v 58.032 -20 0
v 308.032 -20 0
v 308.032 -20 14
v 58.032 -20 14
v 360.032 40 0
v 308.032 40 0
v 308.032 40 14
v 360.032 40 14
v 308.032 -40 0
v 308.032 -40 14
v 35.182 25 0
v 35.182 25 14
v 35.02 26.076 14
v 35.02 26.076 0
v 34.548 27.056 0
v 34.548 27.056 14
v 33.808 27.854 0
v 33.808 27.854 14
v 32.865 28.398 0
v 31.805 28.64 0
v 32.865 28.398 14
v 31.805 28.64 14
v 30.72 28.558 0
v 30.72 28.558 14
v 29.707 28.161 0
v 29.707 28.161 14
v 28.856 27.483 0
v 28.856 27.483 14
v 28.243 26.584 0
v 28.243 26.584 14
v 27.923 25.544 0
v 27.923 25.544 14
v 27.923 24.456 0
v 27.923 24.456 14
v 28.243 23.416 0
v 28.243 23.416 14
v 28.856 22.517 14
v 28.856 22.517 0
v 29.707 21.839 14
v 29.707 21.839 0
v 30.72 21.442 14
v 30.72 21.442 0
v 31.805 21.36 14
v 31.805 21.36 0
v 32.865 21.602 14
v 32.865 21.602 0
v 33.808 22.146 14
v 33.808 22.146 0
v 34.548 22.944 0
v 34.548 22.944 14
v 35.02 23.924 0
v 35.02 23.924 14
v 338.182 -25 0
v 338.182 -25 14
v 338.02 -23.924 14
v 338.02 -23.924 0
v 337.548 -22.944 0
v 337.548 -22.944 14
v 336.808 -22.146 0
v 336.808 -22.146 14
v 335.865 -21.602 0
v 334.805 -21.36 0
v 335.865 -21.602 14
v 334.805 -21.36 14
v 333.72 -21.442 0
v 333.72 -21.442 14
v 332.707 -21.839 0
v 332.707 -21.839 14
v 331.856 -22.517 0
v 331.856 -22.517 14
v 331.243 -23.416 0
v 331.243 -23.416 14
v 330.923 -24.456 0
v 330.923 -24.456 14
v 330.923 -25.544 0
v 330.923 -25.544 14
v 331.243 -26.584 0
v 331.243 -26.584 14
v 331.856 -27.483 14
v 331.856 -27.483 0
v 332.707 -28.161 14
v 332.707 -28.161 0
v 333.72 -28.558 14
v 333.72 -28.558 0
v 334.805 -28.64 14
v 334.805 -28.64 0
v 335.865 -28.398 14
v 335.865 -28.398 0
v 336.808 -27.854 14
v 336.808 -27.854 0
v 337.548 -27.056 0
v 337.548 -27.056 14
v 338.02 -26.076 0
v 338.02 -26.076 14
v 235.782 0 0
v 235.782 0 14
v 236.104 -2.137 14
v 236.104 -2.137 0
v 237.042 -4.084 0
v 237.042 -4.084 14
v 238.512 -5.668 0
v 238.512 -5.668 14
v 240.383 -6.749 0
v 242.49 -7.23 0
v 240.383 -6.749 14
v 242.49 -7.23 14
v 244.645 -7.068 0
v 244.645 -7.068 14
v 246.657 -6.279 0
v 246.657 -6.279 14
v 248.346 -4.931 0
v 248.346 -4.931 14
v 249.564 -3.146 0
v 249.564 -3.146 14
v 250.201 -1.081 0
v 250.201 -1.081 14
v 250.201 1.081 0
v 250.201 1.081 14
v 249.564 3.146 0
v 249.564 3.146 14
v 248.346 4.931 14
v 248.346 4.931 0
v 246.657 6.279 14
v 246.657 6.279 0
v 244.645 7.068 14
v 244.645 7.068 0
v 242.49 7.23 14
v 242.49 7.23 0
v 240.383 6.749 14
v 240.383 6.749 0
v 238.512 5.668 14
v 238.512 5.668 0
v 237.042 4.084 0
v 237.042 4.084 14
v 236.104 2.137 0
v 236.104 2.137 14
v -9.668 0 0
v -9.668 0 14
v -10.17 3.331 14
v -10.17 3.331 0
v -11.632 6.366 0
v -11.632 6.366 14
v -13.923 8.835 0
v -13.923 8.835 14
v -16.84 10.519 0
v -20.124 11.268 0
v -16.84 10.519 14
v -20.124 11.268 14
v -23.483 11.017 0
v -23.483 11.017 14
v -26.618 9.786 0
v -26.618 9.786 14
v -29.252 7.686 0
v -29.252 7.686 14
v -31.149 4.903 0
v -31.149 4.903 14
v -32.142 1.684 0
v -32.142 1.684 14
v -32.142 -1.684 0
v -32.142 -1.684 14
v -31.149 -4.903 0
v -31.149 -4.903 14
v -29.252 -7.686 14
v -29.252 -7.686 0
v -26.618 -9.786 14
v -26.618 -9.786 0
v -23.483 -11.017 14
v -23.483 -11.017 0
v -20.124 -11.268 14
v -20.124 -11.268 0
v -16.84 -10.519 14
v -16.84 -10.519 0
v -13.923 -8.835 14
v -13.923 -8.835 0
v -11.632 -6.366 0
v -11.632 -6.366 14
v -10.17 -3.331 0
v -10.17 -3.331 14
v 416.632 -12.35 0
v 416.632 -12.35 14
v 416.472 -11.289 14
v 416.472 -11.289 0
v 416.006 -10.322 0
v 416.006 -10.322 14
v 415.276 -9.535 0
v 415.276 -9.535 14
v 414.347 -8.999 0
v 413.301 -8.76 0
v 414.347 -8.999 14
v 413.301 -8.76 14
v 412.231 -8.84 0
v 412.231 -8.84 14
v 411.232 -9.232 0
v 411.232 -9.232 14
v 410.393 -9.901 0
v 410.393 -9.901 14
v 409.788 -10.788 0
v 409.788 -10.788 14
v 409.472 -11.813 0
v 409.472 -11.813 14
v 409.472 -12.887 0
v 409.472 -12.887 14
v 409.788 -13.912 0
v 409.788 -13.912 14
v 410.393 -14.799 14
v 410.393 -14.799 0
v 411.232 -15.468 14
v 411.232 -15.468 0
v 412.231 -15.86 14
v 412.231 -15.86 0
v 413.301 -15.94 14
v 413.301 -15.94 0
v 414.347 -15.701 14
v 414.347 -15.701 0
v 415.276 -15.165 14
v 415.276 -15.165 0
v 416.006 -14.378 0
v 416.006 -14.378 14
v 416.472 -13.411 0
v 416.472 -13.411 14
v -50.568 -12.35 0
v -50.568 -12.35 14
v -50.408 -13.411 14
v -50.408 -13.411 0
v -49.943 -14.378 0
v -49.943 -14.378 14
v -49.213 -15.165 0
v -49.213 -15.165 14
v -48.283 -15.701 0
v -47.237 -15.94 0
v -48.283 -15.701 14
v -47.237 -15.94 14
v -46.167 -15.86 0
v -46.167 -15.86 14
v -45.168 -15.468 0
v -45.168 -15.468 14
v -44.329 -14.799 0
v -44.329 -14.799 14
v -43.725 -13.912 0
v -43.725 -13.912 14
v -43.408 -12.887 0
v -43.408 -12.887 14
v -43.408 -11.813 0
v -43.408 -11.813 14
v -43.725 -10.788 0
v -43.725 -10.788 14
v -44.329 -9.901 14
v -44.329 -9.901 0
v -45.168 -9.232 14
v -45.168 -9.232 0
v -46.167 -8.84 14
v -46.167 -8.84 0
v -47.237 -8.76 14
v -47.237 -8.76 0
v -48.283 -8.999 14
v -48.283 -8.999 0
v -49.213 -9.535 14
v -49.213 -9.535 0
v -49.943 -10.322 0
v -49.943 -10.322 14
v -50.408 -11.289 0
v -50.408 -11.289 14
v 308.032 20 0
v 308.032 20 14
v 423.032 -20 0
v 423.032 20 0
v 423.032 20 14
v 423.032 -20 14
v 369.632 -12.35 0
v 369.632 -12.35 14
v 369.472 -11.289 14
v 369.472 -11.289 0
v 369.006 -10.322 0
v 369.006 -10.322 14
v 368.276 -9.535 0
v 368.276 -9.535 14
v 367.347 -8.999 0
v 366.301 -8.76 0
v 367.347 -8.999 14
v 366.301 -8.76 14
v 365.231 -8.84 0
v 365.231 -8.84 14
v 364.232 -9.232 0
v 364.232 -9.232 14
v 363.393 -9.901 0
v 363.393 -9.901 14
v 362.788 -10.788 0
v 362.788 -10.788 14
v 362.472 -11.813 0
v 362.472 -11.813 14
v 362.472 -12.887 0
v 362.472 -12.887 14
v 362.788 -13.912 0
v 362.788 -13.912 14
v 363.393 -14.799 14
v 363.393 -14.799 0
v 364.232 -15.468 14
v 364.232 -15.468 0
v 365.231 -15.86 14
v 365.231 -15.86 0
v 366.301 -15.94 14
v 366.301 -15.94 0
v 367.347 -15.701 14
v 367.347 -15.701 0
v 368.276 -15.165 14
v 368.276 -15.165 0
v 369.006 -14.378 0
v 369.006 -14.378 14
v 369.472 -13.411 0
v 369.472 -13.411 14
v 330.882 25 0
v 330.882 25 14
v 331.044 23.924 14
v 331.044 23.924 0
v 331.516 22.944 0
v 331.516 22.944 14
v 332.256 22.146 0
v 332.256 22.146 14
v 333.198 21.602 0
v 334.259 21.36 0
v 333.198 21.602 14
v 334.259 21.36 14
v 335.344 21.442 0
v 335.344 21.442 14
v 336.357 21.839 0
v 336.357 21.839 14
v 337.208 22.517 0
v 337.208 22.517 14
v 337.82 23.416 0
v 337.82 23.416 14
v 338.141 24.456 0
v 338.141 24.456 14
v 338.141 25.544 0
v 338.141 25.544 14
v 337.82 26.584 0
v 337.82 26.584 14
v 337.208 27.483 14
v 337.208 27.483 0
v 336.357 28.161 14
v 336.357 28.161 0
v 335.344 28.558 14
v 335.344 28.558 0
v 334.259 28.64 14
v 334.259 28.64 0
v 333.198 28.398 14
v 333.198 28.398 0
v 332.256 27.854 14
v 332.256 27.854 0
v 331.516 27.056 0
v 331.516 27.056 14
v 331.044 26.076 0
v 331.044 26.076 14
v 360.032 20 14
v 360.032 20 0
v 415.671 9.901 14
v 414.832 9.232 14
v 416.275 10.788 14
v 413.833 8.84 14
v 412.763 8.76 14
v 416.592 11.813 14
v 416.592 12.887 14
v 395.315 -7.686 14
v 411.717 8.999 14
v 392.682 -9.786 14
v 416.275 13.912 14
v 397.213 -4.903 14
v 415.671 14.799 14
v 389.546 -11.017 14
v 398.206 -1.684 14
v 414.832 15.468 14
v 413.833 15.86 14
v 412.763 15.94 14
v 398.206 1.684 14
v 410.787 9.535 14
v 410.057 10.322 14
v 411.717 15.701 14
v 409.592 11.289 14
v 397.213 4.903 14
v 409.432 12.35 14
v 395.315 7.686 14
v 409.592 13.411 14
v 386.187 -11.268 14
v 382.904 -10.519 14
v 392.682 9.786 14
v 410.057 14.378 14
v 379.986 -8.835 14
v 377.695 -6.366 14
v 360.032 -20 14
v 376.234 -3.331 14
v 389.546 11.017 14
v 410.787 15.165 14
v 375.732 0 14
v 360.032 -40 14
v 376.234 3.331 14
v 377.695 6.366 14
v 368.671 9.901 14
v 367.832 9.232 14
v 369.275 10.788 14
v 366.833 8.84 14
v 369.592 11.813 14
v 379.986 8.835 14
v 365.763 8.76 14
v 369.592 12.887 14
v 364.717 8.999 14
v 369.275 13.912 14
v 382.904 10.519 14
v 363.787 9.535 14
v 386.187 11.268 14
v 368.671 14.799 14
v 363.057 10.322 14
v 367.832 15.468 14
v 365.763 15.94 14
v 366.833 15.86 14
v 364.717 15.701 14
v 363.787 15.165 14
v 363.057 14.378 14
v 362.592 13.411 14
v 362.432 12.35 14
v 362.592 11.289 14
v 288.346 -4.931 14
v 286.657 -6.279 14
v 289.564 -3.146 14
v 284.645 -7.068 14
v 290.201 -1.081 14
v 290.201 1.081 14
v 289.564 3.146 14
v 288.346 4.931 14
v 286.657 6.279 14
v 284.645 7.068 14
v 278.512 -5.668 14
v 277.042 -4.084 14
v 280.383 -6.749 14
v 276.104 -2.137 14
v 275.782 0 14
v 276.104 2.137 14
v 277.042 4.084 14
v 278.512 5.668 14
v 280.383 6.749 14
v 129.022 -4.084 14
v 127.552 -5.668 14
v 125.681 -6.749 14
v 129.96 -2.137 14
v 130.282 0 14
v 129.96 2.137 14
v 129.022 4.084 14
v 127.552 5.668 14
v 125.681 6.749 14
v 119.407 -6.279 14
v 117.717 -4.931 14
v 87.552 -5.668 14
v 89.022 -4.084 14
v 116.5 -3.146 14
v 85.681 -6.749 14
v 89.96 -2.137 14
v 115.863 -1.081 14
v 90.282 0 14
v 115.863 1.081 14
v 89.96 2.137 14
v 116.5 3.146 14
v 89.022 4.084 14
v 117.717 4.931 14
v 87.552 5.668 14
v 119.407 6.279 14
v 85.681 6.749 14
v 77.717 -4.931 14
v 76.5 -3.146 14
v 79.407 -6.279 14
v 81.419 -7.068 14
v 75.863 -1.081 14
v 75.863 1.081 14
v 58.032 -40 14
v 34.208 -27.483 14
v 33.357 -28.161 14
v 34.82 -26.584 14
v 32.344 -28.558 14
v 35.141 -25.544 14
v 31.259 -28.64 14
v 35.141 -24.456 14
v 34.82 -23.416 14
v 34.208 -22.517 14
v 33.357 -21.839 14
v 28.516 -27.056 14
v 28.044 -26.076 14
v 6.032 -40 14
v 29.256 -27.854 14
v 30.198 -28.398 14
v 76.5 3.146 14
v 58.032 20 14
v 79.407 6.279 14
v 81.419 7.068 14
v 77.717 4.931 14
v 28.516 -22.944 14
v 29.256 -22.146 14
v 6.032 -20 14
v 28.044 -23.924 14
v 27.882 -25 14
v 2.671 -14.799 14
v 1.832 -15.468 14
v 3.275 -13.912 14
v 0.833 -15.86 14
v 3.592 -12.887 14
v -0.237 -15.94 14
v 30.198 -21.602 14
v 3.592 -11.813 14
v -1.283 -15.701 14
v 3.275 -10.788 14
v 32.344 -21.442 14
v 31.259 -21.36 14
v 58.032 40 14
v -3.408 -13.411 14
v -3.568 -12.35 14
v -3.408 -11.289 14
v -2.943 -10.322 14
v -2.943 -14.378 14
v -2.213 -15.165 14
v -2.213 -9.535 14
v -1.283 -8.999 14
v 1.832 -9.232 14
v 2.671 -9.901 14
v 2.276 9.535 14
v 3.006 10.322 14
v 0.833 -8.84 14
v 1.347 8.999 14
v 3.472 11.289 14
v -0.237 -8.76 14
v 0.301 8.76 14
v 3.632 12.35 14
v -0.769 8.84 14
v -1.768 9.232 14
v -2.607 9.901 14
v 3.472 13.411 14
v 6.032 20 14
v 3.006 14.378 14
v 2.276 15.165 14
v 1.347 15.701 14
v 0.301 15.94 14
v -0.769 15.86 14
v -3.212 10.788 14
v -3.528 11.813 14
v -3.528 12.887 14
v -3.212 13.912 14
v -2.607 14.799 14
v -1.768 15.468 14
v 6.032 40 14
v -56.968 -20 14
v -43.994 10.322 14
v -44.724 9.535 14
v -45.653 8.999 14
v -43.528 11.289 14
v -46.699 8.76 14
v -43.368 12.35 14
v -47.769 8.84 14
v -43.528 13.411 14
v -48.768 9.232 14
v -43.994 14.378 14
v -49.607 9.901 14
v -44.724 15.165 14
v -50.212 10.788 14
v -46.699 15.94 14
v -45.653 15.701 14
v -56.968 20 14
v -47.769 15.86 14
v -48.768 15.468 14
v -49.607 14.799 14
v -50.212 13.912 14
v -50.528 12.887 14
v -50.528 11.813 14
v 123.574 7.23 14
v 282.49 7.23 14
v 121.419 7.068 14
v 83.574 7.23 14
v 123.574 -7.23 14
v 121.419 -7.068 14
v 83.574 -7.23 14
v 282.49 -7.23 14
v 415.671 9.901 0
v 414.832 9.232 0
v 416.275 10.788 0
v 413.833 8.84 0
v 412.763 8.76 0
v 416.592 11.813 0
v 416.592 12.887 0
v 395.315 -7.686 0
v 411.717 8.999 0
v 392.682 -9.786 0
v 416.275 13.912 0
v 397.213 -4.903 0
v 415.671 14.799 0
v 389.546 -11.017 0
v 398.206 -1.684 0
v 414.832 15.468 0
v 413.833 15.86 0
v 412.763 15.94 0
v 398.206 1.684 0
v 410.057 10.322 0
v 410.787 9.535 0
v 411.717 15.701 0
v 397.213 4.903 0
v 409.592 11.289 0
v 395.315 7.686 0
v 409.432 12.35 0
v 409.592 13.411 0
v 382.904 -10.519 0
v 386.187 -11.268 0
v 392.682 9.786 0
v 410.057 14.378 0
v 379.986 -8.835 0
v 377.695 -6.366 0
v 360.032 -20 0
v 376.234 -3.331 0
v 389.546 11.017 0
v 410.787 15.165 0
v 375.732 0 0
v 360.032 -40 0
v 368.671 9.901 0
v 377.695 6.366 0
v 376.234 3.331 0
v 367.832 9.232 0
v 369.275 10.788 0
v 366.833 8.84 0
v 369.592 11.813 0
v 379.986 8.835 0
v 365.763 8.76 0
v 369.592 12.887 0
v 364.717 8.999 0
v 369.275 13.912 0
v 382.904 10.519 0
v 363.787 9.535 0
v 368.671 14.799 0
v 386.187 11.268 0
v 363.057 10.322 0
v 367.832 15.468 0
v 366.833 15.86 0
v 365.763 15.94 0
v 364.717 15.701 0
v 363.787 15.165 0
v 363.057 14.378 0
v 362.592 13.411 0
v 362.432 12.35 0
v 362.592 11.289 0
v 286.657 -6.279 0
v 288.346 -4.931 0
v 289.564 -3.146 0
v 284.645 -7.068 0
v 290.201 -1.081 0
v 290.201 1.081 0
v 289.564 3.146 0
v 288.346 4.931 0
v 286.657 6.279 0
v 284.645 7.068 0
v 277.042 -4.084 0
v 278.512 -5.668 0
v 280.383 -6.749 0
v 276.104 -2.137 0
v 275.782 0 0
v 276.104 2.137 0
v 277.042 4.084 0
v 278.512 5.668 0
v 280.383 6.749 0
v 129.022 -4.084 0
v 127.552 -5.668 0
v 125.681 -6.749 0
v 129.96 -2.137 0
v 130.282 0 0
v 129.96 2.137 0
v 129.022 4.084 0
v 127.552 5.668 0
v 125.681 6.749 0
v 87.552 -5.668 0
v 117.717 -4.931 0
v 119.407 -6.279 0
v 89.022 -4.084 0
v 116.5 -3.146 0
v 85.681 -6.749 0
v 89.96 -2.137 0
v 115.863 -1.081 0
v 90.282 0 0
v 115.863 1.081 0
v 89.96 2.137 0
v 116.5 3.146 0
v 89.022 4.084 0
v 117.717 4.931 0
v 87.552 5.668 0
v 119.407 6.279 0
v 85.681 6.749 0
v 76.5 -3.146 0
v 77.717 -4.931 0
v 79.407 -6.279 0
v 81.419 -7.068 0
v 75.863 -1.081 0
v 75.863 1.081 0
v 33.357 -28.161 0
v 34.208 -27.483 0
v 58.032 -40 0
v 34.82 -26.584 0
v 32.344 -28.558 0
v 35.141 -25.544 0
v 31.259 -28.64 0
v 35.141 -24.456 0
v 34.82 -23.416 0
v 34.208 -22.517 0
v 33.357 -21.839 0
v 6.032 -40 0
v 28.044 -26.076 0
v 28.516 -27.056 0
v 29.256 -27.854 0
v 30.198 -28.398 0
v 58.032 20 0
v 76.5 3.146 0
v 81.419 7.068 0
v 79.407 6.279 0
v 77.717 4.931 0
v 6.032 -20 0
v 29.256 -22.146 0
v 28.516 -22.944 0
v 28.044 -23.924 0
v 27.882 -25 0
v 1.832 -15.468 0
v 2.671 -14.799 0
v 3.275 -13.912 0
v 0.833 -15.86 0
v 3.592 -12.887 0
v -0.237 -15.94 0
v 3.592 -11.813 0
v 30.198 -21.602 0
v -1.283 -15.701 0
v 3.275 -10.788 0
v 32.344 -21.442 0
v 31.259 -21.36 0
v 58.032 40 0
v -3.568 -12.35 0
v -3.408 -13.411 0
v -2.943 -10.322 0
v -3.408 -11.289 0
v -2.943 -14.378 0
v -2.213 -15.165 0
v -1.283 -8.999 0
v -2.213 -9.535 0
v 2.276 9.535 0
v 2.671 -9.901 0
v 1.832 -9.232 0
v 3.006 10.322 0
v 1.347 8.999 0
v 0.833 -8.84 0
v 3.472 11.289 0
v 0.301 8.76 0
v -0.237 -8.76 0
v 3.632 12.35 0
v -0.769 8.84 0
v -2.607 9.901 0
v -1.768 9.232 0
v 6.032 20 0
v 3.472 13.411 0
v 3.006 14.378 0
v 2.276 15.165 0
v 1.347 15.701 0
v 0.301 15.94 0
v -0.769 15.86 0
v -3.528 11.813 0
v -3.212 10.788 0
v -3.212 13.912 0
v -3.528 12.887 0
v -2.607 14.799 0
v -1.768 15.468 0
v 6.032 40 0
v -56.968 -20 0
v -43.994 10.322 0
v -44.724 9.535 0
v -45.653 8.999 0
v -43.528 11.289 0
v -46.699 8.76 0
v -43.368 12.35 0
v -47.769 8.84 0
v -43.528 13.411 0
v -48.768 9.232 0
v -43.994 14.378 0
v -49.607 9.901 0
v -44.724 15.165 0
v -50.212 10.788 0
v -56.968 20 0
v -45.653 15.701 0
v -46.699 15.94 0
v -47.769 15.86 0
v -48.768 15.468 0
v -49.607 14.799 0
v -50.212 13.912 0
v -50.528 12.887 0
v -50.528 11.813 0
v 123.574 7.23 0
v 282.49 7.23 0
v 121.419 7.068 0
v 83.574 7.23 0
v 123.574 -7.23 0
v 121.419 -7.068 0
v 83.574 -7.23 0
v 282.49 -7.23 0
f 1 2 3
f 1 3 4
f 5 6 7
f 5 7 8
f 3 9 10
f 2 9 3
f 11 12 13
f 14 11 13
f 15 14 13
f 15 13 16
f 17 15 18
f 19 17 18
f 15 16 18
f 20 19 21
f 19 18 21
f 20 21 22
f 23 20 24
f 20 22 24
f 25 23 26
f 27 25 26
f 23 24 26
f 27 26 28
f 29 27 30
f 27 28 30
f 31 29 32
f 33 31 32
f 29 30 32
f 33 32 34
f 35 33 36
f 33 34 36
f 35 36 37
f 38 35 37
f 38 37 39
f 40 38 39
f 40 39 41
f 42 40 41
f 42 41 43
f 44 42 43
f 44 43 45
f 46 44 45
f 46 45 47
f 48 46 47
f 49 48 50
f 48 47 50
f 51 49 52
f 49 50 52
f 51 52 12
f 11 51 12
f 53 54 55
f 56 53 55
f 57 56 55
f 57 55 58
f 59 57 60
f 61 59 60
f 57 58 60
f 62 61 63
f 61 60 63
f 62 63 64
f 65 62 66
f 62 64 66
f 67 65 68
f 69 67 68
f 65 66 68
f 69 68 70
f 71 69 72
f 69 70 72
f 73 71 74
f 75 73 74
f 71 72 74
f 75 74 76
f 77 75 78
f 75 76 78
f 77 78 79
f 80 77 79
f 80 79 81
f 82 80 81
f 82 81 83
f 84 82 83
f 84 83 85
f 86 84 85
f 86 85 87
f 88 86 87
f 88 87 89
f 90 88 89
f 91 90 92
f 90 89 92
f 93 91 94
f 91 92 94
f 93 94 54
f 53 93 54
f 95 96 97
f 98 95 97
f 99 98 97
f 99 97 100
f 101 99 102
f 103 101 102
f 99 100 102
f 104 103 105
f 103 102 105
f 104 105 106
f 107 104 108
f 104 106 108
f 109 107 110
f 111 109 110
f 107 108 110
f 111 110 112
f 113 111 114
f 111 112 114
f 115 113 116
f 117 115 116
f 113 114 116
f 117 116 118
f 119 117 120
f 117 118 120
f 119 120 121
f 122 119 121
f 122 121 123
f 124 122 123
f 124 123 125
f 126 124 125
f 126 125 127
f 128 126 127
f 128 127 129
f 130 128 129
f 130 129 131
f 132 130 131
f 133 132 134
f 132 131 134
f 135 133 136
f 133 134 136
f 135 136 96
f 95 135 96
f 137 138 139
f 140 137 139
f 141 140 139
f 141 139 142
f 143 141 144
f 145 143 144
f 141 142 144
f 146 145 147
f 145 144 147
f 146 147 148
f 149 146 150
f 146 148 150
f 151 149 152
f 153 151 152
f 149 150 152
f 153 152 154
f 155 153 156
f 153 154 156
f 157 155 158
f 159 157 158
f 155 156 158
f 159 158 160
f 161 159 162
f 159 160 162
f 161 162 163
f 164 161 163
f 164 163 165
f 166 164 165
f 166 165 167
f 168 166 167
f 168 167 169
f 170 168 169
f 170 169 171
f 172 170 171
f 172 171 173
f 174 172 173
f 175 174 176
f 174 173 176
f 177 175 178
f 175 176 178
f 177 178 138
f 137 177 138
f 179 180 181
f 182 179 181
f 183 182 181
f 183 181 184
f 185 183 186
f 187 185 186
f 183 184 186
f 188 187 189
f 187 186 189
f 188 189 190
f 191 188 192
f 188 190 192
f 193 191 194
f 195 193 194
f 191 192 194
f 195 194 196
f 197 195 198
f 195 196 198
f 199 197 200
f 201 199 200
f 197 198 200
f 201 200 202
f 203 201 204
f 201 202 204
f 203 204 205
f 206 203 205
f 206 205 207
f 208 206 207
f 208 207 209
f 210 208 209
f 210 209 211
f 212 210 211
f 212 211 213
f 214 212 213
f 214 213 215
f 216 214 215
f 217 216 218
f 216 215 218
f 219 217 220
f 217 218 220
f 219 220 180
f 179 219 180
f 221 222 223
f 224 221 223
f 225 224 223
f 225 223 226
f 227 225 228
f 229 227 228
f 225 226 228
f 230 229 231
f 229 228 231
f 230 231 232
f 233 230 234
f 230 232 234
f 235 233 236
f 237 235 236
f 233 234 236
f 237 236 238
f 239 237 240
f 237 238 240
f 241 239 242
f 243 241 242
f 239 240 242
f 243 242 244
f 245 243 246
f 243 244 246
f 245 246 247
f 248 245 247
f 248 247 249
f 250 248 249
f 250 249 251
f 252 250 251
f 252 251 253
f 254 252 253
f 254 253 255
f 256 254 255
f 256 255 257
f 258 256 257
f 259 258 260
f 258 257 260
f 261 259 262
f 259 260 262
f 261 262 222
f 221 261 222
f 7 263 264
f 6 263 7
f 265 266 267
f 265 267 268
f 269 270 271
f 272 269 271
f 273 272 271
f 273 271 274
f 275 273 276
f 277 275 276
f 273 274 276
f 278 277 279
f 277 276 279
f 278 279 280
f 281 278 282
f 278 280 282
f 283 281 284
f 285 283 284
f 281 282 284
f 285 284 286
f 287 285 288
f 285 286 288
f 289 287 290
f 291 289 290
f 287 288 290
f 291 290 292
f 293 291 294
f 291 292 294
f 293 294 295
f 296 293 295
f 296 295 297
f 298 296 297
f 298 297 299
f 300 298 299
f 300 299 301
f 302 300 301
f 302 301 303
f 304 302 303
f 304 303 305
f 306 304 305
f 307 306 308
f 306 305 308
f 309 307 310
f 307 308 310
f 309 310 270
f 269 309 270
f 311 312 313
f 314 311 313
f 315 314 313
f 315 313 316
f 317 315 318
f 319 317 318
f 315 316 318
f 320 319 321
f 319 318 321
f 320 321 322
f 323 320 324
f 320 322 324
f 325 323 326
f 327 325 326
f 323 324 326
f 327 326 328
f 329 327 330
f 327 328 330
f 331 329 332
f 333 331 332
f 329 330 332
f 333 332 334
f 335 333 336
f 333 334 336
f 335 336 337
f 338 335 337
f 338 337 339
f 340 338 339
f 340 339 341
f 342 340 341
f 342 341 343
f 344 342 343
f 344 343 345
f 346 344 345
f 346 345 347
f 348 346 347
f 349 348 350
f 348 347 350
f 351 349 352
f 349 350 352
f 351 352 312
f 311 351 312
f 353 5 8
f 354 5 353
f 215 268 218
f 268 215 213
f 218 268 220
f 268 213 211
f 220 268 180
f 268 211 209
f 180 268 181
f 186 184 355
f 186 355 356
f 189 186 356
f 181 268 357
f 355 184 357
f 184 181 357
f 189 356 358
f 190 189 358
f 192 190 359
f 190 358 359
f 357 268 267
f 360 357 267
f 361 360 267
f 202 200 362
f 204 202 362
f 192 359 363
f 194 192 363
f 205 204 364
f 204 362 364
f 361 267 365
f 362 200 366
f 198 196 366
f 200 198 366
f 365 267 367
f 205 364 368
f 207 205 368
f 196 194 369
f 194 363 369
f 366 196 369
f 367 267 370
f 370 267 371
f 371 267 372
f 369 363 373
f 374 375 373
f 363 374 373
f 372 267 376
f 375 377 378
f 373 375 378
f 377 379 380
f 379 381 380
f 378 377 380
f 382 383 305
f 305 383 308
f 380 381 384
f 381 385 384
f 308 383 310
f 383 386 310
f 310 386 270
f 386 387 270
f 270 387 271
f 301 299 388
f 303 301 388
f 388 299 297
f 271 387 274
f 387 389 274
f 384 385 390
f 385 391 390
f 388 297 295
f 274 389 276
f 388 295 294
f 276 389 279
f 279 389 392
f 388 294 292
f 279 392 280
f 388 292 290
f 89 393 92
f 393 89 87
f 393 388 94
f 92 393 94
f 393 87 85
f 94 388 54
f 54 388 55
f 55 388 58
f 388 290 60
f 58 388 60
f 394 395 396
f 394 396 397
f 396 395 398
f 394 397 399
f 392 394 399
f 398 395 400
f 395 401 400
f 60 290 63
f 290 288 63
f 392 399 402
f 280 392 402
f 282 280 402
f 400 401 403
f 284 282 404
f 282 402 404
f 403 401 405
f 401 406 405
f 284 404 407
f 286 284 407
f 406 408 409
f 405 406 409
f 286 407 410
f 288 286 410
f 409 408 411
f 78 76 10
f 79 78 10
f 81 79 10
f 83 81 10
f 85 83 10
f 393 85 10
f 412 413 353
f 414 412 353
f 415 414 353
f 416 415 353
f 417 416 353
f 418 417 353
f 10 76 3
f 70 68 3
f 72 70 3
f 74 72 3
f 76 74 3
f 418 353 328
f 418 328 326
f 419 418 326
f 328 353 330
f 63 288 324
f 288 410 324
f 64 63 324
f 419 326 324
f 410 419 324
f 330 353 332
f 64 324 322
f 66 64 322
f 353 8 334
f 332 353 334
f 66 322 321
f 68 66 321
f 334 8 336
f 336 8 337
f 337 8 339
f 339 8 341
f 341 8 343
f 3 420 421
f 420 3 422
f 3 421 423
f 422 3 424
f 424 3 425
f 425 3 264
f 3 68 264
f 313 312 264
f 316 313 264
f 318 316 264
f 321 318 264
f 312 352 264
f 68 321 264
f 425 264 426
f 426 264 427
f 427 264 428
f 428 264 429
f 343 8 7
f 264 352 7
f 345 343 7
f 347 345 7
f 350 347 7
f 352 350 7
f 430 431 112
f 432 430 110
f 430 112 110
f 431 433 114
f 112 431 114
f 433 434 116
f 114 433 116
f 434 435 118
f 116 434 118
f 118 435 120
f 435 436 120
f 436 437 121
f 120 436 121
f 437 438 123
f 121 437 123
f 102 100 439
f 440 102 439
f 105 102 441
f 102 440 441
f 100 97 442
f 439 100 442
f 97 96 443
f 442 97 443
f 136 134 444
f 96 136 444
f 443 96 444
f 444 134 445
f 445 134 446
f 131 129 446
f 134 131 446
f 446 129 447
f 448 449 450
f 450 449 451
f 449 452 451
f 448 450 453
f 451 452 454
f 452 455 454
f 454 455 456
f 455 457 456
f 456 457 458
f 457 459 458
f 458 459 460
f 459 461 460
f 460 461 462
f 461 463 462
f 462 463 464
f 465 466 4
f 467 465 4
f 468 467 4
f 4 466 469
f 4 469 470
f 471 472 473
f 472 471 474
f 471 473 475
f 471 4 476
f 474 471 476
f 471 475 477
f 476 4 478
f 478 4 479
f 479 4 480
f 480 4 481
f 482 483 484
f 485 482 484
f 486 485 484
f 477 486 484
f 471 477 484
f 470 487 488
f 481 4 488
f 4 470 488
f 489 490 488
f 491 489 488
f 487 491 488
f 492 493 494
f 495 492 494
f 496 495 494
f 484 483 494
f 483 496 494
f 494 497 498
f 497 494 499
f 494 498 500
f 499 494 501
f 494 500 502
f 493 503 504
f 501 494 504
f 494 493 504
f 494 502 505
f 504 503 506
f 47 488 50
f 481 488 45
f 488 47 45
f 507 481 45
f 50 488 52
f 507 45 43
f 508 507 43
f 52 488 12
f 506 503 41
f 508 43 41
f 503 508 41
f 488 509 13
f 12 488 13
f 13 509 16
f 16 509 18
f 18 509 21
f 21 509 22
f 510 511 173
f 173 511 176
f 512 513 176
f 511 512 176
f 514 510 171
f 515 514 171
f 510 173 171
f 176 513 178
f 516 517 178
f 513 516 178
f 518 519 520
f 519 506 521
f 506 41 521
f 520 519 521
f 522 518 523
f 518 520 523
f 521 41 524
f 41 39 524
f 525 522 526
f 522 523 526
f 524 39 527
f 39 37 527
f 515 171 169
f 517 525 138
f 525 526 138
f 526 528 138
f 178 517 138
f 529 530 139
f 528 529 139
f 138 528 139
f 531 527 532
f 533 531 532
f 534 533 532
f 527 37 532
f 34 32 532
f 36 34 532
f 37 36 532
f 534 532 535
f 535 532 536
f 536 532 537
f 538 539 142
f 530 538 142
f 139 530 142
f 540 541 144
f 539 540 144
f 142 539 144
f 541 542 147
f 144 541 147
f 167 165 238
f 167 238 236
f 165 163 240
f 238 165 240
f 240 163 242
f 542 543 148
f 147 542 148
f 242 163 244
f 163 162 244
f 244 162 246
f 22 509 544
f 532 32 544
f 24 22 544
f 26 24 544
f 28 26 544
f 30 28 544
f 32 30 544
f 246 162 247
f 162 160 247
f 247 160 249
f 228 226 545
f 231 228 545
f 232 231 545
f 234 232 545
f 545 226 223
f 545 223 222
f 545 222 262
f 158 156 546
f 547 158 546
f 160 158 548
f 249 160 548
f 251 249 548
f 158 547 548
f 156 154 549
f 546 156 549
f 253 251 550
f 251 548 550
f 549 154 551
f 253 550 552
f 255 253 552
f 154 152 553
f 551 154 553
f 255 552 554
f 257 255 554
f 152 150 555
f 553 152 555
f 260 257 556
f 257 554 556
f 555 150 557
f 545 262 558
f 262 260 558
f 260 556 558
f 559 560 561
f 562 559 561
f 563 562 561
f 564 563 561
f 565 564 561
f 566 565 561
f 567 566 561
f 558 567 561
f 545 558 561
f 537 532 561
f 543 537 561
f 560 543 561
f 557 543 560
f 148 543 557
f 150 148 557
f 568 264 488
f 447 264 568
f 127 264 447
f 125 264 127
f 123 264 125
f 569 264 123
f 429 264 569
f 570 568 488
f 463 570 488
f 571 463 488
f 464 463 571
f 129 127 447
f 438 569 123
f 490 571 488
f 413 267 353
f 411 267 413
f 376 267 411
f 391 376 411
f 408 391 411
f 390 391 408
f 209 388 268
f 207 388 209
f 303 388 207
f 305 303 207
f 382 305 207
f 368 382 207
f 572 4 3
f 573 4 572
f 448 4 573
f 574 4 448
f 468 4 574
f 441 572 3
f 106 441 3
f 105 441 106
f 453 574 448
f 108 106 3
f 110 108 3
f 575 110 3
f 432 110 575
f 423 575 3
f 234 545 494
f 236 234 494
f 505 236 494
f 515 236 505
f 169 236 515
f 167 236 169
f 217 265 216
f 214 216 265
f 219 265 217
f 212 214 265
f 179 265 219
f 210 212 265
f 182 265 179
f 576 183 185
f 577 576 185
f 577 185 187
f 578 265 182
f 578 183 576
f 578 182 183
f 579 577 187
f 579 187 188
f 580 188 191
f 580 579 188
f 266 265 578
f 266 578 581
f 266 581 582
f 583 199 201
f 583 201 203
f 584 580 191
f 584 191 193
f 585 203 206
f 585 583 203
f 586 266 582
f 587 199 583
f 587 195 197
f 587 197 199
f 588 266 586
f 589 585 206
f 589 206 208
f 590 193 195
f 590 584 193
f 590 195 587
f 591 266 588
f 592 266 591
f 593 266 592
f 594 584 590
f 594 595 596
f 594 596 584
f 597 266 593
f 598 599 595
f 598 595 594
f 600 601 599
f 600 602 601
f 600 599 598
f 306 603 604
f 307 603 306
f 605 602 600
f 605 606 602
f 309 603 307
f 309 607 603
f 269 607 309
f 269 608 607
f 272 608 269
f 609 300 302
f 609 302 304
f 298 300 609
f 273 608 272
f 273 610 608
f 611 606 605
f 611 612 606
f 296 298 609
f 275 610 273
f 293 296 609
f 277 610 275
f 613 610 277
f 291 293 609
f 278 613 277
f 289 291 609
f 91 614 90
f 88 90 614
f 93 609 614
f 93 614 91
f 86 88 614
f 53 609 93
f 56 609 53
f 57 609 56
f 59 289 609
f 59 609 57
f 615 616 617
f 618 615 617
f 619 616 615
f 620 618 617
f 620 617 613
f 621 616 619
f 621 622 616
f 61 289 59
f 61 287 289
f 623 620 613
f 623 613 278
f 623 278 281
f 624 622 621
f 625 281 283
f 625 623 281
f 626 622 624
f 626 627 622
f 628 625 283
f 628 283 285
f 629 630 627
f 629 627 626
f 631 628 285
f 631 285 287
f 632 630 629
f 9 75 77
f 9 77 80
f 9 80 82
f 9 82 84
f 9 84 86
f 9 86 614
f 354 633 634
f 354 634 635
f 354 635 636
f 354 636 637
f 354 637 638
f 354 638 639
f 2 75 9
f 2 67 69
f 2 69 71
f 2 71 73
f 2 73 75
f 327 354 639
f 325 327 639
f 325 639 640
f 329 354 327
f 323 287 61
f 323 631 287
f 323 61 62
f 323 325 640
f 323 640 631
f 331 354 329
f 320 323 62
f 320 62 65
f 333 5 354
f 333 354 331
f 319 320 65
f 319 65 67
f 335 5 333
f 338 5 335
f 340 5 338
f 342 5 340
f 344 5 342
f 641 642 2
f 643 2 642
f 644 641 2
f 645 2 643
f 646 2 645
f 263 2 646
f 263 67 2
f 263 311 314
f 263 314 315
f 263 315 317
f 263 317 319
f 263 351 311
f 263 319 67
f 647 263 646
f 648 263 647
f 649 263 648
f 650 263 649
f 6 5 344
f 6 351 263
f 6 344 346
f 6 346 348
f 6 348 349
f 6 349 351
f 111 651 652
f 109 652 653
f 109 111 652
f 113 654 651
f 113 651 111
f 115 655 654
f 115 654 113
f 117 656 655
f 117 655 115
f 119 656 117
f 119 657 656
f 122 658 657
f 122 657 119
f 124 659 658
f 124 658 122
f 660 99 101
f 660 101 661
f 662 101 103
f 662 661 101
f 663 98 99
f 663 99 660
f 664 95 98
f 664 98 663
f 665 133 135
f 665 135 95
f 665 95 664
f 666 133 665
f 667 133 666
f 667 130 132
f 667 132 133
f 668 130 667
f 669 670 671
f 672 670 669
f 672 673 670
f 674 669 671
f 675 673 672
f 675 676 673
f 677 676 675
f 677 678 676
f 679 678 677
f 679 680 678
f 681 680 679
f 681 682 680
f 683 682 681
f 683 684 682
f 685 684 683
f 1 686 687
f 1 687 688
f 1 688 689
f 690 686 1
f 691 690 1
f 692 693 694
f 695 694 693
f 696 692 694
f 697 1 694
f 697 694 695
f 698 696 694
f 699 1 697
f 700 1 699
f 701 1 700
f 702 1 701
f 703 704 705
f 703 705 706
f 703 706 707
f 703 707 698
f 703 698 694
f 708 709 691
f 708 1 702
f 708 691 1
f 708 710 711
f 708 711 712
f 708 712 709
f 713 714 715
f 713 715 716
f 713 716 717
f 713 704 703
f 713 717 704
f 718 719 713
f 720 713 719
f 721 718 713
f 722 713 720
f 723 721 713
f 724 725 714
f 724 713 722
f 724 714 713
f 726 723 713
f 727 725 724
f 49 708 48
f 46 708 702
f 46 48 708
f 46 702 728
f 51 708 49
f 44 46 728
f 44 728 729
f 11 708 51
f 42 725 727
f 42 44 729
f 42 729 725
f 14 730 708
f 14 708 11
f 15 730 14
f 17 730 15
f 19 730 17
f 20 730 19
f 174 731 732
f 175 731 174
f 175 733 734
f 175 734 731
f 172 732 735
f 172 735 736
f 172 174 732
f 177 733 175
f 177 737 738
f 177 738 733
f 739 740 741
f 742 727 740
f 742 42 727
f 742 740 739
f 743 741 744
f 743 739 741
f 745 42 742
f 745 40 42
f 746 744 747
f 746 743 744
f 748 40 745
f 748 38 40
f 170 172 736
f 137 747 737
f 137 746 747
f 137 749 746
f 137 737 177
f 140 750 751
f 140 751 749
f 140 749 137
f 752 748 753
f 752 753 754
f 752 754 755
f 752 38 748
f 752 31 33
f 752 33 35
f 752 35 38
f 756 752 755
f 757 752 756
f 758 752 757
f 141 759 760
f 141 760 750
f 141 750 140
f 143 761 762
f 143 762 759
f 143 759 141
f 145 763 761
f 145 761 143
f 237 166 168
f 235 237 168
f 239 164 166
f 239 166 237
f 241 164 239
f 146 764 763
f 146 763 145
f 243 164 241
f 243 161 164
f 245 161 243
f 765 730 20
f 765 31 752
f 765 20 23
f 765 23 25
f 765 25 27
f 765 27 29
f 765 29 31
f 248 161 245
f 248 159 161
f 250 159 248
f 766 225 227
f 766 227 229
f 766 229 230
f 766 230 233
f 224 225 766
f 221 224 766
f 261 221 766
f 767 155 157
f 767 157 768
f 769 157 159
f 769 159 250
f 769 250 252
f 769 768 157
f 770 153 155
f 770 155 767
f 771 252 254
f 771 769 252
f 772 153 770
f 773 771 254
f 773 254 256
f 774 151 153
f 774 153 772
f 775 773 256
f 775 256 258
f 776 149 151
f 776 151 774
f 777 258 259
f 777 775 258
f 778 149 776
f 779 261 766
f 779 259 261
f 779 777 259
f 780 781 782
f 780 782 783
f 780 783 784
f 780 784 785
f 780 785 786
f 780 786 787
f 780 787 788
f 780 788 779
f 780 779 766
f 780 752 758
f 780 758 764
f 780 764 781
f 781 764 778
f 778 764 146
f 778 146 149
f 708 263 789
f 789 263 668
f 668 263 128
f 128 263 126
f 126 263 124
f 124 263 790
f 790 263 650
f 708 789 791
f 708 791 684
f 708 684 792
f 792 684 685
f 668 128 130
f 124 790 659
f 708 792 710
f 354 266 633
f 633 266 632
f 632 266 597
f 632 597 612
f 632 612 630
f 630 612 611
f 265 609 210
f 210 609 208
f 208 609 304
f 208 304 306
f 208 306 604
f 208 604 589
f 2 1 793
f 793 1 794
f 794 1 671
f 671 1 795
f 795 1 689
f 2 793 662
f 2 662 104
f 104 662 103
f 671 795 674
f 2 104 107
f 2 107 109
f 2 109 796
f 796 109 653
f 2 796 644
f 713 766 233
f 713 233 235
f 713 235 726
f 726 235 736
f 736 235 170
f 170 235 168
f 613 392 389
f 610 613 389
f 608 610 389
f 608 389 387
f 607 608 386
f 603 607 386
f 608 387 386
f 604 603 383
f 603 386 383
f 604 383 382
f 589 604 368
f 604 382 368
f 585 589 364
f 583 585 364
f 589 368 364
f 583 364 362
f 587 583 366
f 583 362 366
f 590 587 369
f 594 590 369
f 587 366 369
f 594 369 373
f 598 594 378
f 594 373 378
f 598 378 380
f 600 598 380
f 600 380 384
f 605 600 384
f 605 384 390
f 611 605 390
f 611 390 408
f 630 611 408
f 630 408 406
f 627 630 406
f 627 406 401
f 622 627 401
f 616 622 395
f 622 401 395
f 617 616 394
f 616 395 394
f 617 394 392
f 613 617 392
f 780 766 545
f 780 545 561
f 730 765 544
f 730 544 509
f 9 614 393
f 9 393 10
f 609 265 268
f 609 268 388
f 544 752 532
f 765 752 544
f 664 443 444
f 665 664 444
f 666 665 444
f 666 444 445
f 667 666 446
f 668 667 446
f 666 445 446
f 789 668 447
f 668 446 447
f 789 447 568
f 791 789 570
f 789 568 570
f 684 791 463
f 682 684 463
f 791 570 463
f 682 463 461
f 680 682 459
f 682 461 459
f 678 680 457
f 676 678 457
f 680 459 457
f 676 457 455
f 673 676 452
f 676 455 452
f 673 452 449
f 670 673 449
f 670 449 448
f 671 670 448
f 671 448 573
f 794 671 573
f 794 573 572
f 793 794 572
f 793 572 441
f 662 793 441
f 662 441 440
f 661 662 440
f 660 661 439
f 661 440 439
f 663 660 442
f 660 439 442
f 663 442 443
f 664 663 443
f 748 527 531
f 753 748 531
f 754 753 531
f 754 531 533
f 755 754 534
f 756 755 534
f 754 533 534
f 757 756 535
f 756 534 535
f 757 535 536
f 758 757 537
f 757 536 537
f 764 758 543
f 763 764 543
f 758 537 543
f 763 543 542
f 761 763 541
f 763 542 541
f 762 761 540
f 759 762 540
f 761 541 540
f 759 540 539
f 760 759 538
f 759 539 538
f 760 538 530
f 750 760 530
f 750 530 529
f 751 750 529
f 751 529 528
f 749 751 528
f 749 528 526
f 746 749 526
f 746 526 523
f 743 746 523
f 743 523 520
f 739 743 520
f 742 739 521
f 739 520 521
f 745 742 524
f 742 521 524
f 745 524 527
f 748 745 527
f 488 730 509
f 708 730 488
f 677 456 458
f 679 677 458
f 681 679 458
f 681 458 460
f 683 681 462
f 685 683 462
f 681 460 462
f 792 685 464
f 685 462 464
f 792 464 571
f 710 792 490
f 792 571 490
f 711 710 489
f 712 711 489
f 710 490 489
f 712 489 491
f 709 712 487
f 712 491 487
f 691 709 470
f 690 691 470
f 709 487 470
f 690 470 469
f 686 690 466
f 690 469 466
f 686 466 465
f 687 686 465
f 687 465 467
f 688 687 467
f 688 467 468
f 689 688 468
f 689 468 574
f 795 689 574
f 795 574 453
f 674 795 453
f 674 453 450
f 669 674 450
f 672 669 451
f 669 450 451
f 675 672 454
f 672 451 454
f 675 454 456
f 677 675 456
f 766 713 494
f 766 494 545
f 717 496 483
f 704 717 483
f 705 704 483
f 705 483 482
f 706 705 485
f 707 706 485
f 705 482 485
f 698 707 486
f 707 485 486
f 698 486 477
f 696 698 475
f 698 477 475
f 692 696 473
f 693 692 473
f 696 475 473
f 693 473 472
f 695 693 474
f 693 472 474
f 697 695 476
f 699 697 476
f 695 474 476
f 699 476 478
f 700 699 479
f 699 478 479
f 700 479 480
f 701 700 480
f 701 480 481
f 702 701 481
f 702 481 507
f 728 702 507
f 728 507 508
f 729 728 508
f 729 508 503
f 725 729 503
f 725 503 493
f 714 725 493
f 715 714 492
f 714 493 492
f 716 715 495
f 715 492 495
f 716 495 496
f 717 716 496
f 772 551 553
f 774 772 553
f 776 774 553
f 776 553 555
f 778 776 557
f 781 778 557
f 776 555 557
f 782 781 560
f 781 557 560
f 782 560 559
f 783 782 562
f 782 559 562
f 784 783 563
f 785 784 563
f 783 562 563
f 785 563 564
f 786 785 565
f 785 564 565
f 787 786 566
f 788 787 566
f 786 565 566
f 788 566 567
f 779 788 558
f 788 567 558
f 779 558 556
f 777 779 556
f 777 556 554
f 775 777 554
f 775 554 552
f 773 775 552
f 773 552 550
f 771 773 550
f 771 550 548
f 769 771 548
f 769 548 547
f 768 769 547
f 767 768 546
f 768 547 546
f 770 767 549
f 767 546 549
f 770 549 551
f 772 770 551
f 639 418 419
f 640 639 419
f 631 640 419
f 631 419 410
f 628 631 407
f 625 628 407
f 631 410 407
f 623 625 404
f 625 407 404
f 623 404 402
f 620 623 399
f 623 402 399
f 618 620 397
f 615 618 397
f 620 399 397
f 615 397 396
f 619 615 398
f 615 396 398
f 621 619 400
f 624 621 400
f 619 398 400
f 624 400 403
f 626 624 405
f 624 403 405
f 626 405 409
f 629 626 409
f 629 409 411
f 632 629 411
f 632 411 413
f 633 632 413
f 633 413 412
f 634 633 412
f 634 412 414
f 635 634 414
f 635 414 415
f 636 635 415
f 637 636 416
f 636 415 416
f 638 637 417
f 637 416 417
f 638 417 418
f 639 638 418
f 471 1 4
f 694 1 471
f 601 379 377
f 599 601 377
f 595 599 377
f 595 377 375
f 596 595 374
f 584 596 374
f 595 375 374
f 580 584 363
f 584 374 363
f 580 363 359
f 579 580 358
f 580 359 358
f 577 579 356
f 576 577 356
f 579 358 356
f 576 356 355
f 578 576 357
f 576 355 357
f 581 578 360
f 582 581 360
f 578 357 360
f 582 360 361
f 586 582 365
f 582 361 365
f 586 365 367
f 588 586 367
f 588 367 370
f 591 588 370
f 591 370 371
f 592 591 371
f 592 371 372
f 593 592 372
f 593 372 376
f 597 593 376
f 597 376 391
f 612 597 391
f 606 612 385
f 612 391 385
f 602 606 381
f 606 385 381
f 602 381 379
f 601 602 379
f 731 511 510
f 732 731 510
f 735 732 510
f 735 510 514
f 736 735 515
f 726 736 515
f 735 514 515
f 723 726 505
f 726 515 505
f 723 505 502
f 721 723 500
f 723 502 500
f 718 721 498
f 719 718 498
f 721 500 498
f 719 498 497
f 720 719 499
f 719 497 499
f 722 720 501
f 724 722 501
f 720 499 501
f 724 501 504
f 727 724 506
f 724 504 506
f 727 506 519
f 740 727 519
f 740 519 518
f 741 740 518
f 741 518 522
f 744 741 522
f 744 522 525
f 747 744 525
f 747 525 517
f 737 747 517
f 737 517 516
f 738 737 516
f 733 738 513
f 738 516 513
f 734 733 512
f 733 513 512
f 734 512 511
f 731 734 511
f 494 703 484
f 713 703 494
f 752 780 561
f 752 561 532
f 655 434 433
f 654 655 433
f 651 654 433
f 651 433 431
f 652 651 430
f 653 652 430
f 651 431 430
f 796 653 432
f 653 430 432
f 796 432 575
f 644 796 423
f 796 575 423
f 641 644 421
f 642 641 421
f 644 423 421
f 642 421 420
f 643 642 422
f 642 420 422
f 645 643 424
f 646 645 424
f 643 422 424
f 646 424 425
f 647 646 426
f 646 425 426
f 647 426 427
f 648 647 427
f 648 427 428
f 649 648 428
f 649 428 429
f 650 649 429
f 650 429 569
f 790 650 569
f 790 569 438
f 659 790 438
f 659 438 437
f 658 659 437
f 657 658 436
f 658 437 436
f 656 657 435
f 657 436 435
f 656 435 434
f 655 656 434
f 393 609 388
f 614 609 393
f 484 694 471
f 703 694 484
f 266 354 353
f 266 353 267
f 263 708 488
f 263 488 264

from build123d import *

# Parameters (mm, degrees)
BOSS_EXTRUDE1_DEPTH = 14
SKETCH3_R           = 11.3
SKETCH3_R_2         = 3.6
SKETCH3_R_3         = 3.65
SKETCH3_R_4         = 7.25
CUT_EXTRUDE1_DEPTH  = 14


with BuildPart() as part:
    # Sketch2 → Boss-Extrude1 (new body)
    with BuildSketch(Plane.XY):
        Polygon((-56.968136793, -20), (-56.968136793, 20), (6.031863207, 20), (6.031863207, 40), (58.031863207, 40), (58.031863207, 20), (308.031863207, 20), (308.031863207, 40), (360.031863207, 40), (360.031863207, 20), (423.031863207, 20), (423.031863207, -20), (360.031863207, -20), (360.031863207, -40), (308.031863207, -40), (308.031863207, -20), (58.031863207, -20), (58.031863207, -40), (6.031863207, -40), (6.031863207, -20), align=None)
    extrude(amount=BOSS_EXTRUDE1_DEPTH)

    # Sketch3 → Cut-Extrude1 (cut)
    with BuildSketch(Plane.XY.offset(14)):
        with Locations((-20.968136793, 0)):
            Circle(SKETCH3_R)
        with Locations((-46.968136793, 12.35)):
            Circle(SKETCH3_R_2)
        with Locations((0.031863207, 12.35)):
            Circle(SKETCH3_R_2)
        with Locations(Location((0.031863207, -12.35, 0), (0, 0, 180))):
            Circle(SKETCH3_R_2)
        with Locations(Location((-46.968136793, -12.35, 0), (0, 0, 180))):
            Circle(SKETCH3_R_2)
        with Locations((31.531863207, 25)):
            Circle(SKETCH3_R_3)
        with Locations(Location((31.531863207, -25, 0), (0, 0, 180))):
            Circle(SKETCH3_R_3)
        with Locations((83.031863207, 0)):
            Circle(SKETCH3_R_4)
        with Locations((123.031863207, 0)):
            Circle(SKETCH3_R_4)
        with Locations(Location((283.031863207, 0, 0), (0, 0, 180))):
            Circle(SKETCH3_R_4)
        with Locations(Location((243.031863207, 0, 0), (0, 0, 180))):
            Circle(SKETCH3_R_4)
        with Locations((334.531863207, -25)):
            Circle(SKETCH3_R_3)
        with Locations(Location((334.531863207, 25, 0), (0, 0, 180))):
            Circle(SKETCH3_R_3)
        with Locations((366.031863207, -12.35)):
            Circle(SKETCH3_R_2)
        with Locations(Location((366.031863207, 12.35, 0), (0, 0, 180))):
            Circle(SKETCH3_R_2)
        with Locations(Location((387.031863207, 0, 0), (0, 0, 180))):
            Circle(SKETCH3_R)
        with Locations((413.031863207, -12.35)):
            Circle(SKETCH3_R_2)
        with Locations(Location((413.031863207, 12.35, 0), (0, 0, 180))):
            Circle(SKETCH3_R_2)
    extrude(amount=-CUT_EXTRUDE1_DEPTH, mode=Mode.SUBTRACT)


solid = part.part
